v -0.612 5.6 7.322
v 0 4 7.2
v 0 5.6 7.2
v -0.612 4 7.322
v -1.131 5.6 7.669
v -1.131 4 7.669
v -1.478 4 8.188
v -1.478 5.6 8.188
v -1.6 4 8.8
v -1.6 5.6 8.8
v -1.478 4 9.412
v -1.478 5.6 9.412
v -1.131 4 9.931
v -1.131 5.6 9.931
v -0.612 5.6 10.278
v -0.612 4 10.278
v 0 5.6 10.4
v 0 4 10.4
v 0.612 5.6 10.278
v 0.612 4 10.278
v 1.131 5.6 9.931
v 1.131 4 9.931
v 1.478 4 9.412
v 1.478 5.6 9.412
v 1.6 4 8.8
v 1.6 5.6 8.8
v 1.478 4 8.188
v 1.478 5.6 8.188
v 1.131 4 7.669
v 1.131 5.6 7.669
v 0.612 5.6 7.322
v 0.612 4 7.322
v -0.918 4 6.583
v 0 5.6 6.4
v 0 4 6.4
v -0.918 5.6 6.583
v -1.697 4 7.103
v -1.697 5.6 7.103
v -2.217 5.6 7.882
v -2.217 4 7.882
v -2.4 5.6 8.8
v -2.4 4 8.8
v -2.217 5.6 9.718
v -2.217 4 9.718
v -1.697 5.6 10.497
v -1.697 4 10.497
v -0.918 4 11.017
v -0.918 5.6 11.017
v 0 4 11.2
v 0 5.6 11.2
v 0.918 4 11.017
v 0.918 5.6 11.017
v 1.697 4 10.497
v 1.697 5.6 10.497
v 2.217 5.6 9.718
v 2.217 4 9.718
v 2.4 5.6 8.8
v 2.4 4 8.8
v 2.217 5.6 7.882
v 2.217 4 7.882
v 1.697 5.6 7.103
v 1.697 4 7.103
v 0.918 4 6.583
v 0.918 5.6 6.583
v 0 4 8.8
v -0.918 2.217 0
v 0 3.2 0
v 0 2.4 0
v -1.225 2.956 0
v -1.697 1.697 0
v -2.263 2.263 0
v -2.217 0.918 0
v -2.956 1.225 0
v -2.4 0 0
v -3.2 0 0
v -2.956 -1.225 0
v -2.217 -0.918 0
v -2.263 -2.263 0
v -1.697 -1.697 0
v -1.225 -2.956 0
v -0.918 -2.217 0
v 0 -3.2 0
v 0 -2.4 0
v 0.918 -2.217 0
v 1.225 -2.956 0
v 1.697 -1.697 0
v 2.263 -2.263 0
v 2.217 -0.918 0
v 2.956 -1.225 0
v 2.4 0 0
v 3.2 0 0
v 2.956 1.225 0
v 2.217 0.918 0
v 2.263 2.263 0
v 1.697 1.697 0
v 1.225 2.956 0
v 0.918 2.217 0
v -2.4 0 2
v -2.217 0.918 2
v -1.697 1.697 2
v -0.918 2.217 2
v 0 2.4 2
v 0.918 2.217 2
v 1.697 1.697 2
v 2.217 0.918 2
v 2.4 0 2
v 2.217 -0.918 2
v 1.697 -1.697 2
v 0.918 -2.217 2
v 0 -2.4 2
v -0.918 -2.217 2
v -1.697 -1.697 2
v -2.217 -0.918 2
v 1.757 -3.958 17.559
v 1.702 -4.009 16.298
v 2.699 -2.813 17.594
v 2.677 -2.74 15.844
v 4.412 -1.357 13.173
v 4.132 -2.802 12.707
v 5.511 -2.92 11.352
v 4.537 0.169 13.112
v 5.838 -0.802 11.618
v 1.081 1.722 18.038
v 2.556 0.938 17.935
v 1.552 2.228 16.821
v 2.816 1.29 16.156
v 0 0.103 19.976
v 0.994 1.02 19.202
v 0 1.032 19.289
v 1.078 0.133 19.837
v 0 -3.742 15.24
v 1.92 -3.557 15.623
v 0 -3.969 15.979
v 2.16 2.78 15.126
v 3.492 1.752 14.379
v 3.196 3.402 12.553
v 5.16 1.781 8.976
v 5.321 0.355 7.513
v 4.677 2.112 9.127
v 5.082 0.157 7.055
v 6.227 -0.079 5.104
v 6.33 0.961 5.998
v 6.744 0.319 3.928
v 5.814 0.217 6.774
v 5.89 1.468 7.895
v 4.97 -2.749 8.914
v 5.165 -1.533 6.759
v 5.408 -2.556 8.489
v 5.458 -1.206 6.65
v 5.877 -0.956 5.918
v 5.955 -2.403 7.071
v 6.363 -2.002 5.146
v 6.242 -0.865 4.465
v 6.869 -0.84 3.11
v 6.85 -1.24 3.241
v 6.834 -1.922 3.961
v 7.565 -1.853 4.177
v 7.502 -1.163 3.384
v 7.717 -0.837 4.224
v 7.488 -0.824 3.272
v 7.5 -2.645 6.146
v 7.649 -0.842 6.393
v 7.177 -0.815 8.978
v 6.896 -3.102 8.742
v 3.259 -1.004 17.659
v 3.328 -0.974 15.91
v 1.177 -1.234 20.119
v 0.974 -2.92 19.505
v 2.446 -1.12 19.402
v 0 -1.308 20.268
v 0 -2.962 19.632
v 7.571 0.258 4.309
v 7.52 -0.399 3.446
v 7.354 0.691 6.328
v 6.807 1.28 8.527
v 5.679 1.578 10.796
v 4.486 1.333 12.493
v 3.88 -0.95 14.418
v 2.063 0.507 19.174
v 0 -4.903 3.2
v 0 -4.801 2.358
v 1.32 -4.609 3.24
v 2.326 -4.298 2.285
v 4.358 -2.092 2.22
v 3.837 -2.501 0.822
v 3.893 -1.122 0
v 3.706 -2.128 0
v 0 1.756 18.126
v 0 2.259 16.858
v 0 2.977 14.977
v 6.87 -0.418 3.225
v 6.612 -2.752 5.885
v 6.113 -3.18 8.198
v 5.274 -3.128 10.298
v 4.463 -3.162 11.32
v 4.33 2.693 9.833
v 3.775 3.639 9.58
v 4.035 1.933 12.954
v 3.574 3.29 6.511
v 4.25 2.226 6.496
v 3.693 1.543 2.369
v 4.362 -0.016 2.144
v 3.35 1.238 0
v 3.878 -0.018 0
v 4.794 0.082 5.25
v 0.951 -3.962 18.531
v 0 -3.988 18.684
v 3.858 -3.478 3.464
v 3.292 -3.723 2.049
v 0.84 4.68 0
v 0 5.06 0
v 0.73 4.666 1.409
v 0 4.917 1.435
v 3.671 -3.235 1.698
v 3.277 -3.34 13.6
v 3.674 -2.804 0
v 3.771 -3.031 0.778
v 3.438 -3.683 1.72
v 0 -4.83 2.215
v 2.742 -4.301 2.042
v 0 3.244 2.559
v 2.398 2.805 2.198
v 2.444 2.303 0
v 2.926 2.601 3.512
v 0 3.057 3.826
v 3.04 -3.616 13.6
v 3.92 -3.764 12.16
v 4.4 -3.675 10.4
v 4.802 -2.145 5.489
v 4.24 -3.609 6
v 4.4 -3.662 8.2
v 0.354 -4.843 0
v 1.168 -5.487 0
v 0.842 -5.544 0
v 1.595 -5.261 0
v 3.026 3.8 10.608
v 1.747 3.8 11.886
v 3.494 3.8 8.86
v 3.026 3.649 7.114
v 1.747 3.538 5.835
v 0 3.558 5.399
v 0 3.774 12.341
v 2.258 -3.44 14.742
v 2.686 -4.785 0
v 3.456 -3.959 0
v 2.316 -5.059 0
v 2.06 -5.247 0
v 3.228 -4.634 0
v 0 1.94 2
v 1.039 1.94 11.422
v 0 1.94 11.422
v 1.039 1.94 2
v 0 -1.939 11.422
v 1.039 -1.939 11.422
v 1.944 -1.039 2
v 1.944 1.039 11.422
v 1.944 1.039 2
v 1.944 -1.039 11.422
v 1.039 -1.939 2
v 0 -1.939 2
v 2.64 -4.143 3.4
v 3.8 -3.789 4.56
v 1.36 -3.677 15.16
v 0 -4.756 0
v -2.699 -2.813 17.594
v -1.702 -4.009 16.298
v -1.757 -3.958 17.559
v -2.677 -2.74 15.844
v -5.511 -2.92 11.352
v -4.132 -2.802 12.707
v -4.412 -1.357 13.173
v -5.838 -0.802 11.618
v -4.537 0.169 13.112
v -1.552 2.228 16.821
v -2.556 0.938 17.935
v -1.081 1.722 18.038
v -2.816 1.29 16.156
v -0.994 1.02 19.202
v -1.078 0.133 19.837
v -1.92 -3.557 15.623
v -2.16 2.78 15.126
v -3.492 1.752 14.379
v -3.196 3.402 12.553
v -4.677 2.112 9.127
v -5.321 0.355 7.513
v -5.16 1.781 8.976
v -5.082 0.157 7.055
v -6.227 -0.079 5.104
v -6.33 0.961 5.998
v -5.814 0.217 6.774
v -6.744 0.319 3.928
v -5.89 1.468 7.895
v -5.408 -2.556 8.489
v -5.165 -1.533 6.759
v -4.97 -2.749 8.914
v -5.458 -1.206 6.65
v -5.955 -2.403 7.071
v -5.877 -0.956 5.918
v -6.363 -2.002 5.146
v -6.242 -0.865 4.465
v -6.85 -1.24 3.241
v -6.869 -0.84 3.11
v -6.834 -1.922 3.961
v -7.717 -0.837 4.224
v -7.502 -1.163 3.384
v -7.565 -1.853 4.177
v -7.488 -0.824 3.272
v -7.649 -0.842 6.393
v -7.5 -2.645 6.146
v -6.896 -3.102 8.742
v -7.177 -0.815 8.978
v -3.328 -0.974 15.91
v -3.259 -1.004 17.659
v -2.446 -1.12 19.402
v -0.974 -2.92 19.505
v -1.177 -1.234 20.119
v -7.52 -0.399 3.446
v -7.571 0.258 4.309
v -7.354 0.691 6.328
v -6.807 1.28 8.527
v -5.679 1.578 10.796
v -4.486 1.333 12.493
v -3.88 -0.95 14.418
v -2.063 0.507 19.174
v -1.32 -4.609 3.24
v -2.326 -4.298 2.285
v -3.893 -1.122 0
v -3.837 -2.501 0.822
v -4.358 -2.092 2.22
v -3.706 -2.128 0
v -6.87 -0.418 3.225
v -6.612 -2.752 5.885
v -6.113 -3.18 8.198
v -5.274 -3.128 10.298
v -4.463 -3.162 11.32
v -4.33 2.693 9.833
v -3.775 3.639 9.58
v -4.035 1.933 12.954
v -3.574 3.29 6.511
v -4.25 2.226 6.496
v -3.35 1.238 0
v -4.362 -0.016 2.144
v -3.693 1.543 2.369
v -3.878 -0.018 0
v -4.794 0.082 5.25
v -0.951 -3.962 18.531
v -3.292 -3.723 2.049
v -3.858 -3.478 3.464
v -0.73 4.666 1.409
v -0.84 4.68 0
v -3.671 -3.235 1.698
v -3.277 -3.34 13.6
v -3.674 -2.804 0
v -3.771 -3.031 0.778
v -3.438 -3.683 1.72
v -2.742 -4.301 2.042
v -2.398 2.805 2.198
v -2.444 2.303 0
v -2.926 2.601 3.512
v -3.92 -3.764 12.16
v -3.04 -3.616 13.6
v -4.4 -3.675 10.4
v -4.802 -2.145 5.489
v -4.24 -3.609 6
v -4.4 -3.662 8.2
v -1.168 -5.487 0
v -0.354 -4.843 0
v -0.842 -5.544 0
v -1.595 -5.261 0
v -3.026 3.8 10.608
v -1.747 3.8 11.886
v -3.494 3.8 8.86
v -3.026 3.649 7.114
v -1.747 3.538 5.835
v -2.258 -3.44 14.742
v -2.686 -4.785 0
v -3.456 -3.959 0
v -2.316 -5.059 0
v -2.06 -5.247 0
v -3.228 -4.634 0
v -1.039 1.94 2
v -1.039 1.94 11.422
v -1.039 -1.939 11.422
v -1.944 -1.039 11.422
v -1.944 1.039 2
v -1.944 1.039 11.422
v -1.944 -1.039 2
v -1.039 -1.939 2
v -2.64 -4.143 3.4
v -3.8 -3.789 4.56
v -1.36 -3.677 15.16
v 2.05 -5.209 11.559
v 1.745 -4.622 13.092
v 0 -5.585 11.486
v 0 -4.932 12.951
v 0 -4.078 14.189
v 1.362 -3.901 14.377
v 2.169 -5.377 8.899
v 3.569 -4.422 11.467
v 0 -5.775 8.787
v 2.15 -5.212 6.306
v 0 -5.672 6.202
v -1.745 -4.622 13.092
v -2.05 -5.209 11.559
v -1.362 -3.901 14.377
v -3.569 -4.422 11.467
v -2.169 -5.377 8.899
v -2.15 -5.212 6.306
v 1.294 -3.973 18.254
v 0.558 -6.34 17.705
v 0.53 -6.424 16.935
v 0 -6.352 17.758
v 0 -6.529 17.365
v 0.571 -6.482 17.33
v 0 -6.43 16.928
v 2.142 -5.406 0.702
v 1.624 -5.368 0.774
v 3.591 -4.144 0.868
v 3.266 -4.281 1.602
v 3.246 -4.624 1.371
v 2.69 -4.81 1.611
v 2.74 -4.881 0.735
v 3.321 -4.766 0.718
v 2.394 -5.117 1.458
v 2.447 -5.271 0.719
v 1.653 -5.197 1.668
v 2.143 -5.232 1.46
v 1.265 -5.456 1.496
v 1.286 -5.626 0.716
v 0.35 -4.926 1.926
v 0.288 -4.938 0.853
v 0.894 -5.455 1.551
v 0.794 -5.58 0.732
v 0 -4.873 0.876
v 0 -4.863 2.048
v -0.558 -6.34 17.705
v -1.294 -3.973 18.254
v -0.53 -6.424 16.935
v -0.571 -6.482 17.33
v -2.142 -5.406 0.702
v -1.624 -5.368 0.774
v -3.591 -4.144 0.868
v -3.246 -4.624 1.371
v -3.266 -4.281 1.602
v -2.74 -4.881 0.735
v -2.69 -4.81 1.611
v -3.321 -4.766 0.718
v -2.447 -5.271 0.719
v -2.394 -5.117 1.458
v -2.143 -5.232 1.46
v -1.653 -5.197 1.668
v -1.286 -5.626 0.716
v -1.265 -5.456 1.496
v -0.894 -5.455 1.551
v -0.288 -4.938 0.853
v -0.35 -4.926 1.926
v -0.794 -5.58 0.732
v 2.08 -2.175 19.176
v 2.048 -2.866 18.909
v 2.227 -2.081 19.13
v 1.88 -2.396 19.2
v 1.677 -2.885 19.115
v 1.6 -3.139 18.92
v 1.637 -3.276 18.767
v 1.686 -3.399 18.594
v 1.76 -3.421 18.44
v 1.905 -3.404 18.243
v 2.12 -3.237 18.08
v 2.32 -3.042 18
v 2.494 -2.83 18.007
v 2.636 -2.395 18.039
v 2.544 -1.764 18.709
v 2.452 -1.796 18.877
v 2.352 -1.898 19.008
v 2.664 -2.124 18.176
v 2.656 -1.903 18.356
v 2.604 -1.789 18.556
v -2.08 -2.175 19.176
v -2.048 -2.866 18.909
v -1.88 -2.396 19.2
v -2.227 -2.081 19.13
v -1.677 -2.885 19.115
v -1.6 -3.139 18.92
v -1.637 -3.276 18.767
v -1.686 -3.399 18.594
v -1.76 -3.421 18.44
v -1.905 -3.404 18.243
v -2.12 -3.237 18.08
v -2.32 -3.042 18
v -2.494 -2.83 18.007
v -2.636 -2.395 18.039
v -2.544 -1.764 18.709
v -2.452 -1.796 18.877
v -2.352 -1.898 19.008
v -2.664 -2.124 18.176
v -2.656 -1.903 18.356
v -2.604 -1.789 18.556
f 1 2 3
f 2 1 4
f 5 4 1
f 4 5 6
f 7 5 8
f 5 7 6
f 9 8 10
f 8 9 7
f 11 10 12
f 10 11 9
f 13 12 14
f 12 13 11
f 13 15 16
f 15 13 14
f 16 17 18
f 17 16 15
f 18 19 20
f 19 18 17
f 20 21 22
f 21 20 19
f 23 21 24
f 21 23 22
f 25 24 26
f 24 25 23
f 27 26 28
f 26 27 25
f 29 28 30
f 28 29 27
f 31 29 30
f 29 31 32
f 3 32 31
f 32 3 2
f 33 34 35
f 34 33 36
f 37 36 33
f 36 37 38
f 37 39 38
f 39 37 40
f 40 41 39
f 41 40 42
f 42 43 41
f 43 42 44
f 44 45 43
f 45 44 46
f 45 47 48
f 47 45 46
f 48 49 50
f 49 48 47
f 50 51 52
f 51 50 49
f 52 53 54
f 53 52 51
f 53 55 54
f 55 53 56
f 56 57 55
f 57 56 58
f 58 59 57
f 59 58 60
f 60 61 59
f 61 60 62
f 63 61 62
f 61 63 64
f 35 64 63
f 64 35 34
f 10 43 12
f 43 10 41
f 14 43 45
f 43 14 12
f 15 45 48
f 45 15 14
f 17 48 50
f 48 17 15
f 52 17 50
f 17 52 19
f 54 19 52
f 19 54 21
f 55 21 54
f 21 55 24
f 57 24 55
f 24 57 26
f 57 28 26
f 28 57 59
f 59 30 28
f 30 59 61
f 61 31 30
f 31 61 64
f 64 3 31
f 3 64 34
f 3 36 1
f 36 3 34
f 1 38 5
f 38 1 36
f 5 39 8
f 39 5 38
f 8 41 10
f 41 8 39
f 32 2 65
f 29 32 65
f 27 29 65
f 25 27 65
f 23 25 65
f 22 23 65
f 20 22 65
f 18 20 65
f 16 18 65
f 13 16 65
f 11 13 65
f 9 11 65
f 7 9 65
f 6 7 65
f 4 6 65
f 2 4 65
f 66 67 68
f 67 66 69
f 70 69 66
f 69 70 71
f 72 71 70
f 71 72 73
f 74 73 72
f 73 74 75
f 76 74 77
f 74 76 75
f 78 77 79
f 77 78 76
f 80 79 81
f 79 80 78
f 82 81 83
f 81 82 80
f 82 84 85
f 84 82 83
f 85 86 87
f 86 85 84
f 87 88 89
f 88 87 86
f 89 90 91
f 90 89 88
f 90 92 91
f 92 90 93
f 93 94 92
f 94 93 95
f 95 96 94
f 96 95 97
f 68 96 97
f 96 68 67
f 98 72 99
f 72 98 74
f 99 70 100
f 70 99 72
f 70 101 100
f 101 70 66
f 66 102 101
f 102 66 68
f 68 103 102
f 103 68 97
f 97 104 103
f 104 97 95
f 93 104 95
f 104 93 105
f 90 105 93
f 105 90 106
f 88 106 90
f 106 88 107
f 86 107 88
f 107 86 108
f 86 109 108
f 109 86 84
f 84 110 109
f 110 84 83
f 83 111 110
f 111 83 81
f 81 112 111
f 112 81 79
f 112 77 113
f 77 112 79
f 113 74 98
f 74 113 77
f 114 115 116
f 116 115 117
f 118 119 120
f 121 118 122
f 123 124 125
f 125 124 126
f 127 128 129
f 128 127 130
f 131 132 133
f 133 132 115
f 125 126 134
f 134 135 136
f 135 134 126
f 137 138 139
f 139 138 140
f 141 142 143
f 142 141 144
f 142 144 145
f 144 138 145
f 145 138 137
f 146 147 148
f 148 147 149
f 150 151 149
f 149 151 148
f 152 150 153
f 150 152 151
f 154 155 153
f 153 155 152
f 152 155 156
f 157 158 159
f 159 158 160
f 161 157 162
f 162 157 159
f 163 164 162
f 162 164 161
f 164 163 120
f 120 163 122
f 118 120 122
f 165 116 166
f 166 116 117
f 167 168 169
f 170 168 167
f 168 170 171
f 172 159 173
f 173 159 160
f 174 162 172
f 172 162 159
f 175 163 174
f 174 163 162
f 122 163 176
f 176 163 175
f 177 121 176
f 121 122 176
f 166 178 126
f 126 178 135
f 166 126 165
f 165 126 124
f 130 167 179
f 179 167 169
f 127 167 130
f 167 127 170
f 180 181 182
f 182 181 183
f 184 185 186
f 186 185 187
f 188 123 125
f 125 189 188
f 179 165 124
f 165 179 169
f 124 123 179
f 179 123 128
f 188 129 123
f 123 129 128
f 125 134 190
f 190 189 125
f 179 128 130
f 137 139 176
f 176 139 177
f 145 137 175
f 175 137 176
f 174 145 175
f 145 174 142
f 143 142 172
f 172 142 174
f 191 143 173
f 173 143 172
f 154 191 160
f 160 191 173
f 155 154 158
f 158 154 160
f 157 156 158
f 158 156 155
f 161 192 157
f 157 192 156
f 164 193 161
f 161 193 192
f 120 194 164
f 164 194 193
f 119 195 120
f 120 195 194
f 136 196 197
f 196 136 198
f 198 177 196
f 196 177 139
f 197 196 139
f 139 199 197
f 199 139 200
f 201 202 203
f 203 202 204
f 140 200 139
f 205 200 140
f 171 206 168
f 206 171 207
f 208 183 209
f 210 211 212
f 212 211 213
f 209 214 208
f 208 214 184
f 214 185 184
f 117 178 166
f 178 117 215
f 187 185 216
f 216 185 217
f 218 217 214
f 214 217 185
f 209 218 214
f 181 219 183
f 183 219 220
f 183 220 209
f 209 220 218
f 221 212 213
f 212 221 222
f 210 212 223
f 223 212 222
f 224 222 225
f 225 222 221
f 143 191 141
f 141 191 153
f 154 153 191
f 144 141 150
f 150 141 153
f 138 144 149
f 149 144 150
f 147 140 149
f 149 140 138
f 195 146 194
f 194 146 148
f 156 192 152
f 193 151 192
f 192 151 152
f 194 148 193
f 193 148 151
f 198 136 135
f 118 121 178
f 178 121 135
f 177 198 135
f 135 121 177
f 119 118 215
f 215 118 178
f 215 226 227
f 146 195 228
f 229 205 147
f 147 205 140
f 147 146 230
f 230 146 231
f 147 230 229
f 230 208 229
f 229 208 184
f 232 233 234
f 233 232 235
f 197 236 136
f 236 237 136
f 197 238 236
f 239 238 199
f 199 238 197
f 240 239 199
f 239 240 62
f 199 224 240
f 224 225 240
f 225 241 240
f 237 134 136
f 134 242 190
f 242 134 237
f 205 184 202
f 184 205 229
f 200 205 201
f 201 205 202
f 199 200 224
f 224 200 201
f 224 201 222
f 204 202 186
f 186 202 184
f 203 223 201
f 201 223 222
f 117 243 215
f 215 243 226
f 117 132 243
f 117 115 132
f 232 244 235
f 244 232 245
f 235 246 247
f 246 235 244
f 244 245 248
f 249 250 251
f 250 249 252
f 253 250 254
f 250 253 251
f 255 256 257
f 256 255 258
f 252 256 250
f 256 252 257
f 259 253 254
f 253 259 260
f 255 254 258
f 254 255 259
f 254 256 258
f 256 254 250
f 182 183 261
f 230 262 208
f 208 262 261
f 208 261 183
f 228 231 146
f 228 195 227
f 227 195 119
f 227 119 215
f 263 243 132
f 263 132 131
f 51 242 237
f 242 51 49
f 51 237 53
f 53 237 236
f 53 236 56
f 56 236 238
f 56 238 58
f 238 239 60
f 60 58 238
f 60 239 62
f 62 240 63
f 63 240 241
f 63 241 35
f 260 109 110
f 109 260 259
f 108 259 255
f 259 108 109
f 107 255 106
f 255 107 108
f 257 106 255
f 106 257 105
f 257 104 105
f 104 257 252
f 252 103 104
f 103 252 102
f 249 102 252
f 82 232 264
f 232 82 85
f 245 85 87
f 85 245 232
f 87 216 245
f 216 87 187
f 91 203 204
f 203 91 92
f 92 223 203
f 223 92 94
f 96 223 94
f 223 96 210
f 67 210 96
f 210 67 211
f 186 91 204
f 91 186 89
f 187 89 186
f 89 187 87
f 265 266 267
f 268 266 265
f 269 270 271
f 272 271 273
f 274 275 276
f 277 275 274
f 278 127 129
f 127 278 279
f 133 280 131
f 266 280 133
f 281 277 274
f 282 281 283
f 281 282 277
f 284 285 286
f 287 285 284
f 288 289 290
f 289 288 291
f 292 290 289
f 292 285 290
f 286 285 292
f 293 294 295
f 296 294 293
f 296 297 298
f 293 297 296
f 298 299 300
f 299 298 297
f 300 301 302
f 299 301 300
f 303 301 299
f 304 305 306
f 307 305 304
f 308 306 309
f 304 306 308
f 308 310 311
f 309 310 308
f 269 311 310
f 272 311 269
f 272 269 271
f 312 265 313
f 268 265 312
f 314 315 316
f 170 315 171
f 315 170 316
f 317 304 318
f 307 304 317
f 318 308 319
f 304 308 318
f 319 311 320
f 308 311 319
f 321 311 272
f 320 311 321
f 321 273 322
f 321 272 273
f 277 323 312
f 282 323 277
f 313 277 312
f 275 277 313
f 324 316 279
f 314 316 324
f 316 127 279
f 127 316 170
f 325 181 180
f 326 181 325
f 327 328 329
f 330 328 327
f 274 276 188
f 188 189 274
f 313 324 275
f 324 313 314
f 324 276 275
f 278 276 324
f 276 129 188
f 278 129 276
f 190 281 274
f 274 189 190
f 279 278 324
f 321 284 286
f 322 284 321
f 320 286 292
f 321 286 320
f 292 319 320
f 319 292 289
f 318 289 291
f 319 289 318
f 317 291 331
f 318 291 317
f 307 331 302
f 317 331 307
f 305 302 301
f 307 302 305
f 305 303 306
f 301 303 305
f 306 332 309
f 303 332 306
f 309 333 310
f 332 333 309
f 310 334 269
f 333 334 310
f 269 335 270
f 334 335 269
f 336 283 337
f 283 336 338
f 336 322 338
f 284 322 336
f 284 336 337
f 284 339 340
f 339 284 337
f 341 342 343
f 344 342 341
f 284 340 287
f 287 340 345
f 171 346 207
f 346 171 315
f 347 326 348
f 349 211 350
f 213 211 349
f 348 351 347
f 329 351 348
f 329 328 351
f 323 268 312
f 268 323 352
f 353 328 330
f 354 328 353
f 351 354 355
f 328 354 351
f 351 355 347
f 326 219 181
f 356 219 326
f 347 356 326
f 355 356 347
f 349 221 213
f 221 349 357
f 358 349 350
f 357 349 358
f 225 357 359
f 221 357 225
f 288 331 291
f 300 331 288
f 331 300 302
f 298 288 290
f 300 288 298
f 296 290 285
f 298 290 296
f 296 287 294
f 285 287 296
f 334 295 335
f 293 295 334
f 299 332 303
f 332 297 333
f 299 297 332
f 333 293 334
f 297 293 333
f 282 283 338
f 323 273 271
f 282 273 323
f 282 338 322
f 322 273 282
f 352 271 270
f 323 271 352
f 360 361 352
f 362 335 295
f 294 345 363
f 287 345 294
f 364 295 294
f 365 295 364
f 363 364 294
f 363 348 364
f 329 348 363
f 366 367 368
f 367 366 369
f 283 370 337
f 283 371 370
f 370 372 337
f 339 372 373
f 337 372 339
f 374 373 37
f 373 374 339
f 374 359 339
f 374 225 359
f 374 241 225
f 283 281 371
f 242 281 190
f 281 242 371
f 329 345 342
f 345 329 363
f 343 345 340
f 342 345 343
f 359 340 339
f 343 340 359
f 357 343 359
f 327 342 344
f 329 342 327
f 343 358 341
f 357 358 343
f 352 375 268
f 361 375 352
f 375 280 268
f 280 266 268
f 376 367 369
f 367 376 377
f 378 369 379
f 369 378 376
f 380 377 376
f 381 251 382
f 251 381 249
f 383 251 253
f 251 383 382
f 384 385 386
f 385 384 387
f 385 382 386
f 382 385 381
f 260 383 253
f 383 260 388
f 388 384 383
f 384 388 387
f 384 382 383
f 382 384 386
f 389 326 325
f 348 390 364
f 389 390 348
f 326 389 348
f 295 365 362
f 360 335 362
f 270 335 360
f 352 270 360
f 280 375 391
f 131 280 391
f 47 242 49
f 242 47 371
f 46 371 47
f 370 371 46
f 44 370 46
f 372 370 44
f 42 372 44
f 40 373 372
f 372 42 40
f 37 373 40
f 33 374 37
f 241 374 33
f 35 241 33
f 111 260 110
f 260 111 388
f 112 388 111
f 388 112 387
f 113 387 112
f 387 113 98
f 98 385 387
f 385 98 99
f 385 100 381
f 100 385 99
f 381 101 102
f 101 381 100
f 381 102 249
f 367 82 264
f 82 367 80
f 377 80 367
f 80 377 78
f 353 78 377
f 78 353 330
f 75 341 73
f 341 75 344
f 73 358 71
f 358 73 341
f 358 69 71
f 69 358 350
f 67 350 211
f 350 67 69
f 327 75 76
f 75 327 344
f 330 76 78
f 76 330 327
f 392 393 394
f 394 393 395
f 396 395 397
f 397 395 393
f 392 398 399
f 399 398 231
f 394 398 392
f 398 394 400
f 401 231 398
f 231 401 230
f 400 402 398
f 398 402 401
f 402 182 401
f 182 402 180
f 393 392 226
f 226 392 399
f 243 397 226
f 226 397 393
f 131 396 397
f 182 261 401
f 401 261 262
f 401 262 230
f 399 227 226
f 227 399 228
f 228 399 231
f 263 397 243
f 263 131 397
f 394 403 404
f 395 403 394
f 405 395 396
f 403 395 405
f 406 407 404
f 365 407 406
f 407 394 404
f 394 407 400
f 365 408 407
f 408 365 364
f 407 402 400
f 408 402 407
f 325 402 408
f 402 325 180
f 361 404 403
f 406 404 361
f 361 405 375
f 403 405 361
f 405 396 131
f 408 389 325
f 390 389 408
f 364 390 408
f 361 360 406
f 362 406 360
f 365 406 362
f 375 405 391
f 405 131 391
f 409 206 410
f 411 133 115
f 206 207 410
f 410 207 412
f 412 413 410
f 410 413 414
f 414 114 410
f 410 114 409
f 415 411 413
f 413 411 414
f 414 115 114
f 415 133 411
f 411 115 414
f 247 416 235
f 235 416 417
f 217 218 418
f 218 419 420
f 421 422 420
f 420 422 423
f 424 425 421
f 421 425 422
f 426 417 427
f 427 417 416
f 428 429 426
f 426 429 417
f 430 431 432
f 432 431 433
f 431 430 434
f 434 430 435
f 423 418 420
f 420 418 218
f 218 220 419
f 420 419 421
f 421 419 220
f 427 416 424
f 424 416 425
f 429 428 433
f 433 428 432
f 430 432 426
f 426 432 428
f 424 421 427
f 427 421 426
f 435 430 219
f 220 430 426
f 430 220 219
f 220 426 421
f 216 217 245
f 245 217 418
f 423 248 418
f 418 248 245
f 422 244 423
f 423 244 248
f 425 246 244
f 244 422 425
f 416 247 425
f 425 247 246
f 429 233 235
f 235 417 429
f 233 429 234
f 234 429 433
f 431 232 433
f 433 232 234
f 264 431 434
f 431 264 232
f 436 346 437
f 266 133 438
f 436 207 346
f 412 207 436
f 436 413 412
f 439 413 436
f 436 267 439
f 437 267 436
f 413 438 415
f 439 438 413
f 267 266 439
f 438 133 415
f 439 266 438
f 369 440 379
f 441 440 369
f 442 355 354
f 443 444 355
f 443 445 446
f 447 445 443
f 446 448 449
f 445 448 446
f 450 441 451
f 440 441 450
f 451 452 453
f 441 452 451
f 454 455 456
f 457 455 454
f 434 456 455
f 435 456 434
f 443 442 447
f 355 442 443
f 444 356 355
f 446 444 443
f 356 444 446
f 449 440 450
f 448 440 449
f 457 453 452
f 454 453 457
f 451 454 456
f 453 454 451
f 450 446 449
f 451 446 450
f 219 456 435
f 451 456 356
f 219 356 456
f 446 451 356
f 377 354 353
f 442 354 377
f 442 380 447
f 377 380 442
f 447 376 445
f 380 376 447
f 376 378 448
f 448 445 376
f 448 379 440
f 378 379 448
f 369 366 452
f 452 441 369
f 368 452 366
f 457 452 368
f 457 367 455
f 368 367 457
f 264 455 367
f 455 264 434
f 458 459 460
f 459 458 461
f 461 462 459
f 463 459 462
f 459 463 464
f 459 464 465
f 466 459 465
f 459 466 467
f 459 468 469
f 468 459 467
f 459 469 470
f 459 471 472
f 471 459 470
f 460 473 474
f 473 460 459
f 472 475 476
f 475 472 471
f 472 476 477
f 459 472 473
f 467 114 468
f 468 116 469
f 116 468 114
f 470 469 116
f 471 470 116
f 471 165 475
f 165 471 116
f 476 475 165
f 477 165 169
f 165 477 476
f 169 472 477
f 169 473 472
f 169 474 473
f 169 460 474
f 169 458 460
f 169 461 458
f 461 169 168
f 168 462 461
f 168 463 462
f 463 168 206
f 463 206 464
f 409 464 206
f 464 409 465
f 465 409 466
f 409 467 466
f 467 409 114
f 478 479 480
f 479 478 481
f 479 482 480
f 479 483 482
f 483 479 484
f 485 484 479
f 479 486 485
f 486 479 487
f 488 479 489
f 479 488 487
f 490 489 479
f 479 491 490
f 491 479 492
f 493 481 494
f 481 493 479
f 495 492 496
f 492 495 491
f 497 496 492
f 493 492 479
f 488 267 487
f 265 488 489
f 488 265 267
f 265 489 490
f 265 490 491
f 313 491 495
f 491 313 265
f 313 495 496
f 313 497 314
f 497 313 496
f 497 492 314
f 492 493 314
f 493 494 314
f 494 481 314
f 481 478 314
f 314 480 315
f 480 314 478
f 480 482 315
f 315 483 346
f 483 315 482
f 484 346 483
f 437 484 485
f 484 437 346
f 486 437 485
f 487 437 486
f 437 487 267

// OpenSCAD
use <../lib.scad>
use <../p/4-4disc.scad>
use <s/26074p02s01.scad>
use <s/26074s01.scad>
use <s/26074s02.scad>
use <s/26074s03.scad>
use <s/26074s04.scad>
use <../p/stud2.scad>
use <../p/stud4od.scad>
function ldraw_lib__26074p02() = [
// 0 Animal Penguin with White Belly, Red Eyes and Orange Beak and Feet Pattern
// 0 Name: 26074p02.dat
// 0 Author: Philippe Hurbain [Philo]
// 0 !LDRAW_ORG Part UPDATE 2018-02
// 0 !LICENSE Licensed under CC BY 4.0 : see CAreadme.txt
// 
// 0 BFC CERTIFY CCW
  [0,"BFC","CERTIFY"],
  [0,"BFC","CCW"],
// 
// 0 !HISTORY 2018-01-09 {LEGO Digital Designer} Original part shape
// 0 !HISTORY 2018-01-30 [Philo] File preparation for LDraw Parts Tracker
// 0 !HISTORY 2018-12-08 [PTadmin] Official Update 2018-02
// 
// 
// 1 16 0 -22 10 0 0 -1 1 0 0 0 -1 0 stud2.dat
  [1,16,0,-22,10,0,0,-1,1,0,0,0,-1,0, ldraw_lib__stud2()],
// 1 16 0 -22 10 0 0 4 4 0 0 0 -1 0 4-4disc.dat
  [1,16,0,-22,10,0,0,4,4,0,0,0,-1,0, ldraw_lib__4_4disc()],
// 1 16 0 -5 0 1 0 0 0 -1.25 0 0 0 1 stud4od.dat
  [1,16,0,-5,0,1,0,0,0,-1.25,0,0,0,1, ldraw_lib__stud4od()],
// 
// 1 16 0 0 0 1 0 0 0 1 0 0 0 1 s\26074s01.dat
  [1,16,0,0,0,1,0,0,0,1,0,0,0,1, ldraw_lib__s__26074s01()],
// 1 16 0 0 0 -1 0 0 0 1 0 0 0 1 s\26074s01.dat
  [1,16,0,0,0,-1,0,0,0,1,0,0,0,1, ldraw_lib__s__26074s01()],
// 1 15 0 0 0 1 0 0 0 1 0 0 0 1 s\26074s02.dat
  [1,15,0,0,0,1,0,0,0,1,0,0,0,1, ldraw_lib__s__26074s02()],
// 1 15 0 0 0 -1 0 0 0 1 0 0 0 1 s\26074s02.dat
  [1,15,0,0,0,-1,0,0,0,1,0,0,0,1, ldraw_lib__s__26074s02()],
// 1 25 0 0 0 1 0 0 0 1 0 0 0 1 s\26074s03.dat
  [1,25,0,0,0,1,0,0,0,1,0,0,0,1, ldraw_lib__s__26074s03()],
// 1 25 0 0 0 1 0 0 0 1 0 0 0 1 s\26074s04.dat
  [1,25,0,0,0,1,0,0,0,1,0,0,0,1, ldraw_lib__s__26074s04()],
// 1 25 0 0 0 -1 0 0 0 1 0 0 0 1 s\26074s03.dat
  [1,25,0,0,0,-1,0,0,0,1,0,0,0,1, ldraw_lib__s__26074s03()],
// 1 25 0 0 0 -1 0 0 0 1 0 0 0 1 s\26074s04.dat
  [1,25,0,0,0,-1,0,0,0,1,0,0,0,1, ldraw_lib__s__26074s04()],
// 1 16 0 0 0 1 0 0 0 1 0 0 0 1 s\26074p02s01.dat
  [1,16,0,0,0,1,0,0,0,1,0,0,0,1, ldraw_lib__s__26074p02s01()],
// 1 16 0 0 0 -1 0 0 0 1 0 0 0 1 s\26074p02s01.dat
  [1,16,0,0,0,-1,0,0,0,1,0,0,0,1, ldraw_lib__s__26074p02s01()],
];
module ldraw_lib__26074p02(step=0, col=false, unit=2/5, alt=false, line=0.2, solid=!$preview)
    makepoly(ldraw_lib__26074p02(), step=step, col=col, unit=unit, alt=alt, line=line, solid=solid);
ldraw_lib__26074p02(line=0.2);
